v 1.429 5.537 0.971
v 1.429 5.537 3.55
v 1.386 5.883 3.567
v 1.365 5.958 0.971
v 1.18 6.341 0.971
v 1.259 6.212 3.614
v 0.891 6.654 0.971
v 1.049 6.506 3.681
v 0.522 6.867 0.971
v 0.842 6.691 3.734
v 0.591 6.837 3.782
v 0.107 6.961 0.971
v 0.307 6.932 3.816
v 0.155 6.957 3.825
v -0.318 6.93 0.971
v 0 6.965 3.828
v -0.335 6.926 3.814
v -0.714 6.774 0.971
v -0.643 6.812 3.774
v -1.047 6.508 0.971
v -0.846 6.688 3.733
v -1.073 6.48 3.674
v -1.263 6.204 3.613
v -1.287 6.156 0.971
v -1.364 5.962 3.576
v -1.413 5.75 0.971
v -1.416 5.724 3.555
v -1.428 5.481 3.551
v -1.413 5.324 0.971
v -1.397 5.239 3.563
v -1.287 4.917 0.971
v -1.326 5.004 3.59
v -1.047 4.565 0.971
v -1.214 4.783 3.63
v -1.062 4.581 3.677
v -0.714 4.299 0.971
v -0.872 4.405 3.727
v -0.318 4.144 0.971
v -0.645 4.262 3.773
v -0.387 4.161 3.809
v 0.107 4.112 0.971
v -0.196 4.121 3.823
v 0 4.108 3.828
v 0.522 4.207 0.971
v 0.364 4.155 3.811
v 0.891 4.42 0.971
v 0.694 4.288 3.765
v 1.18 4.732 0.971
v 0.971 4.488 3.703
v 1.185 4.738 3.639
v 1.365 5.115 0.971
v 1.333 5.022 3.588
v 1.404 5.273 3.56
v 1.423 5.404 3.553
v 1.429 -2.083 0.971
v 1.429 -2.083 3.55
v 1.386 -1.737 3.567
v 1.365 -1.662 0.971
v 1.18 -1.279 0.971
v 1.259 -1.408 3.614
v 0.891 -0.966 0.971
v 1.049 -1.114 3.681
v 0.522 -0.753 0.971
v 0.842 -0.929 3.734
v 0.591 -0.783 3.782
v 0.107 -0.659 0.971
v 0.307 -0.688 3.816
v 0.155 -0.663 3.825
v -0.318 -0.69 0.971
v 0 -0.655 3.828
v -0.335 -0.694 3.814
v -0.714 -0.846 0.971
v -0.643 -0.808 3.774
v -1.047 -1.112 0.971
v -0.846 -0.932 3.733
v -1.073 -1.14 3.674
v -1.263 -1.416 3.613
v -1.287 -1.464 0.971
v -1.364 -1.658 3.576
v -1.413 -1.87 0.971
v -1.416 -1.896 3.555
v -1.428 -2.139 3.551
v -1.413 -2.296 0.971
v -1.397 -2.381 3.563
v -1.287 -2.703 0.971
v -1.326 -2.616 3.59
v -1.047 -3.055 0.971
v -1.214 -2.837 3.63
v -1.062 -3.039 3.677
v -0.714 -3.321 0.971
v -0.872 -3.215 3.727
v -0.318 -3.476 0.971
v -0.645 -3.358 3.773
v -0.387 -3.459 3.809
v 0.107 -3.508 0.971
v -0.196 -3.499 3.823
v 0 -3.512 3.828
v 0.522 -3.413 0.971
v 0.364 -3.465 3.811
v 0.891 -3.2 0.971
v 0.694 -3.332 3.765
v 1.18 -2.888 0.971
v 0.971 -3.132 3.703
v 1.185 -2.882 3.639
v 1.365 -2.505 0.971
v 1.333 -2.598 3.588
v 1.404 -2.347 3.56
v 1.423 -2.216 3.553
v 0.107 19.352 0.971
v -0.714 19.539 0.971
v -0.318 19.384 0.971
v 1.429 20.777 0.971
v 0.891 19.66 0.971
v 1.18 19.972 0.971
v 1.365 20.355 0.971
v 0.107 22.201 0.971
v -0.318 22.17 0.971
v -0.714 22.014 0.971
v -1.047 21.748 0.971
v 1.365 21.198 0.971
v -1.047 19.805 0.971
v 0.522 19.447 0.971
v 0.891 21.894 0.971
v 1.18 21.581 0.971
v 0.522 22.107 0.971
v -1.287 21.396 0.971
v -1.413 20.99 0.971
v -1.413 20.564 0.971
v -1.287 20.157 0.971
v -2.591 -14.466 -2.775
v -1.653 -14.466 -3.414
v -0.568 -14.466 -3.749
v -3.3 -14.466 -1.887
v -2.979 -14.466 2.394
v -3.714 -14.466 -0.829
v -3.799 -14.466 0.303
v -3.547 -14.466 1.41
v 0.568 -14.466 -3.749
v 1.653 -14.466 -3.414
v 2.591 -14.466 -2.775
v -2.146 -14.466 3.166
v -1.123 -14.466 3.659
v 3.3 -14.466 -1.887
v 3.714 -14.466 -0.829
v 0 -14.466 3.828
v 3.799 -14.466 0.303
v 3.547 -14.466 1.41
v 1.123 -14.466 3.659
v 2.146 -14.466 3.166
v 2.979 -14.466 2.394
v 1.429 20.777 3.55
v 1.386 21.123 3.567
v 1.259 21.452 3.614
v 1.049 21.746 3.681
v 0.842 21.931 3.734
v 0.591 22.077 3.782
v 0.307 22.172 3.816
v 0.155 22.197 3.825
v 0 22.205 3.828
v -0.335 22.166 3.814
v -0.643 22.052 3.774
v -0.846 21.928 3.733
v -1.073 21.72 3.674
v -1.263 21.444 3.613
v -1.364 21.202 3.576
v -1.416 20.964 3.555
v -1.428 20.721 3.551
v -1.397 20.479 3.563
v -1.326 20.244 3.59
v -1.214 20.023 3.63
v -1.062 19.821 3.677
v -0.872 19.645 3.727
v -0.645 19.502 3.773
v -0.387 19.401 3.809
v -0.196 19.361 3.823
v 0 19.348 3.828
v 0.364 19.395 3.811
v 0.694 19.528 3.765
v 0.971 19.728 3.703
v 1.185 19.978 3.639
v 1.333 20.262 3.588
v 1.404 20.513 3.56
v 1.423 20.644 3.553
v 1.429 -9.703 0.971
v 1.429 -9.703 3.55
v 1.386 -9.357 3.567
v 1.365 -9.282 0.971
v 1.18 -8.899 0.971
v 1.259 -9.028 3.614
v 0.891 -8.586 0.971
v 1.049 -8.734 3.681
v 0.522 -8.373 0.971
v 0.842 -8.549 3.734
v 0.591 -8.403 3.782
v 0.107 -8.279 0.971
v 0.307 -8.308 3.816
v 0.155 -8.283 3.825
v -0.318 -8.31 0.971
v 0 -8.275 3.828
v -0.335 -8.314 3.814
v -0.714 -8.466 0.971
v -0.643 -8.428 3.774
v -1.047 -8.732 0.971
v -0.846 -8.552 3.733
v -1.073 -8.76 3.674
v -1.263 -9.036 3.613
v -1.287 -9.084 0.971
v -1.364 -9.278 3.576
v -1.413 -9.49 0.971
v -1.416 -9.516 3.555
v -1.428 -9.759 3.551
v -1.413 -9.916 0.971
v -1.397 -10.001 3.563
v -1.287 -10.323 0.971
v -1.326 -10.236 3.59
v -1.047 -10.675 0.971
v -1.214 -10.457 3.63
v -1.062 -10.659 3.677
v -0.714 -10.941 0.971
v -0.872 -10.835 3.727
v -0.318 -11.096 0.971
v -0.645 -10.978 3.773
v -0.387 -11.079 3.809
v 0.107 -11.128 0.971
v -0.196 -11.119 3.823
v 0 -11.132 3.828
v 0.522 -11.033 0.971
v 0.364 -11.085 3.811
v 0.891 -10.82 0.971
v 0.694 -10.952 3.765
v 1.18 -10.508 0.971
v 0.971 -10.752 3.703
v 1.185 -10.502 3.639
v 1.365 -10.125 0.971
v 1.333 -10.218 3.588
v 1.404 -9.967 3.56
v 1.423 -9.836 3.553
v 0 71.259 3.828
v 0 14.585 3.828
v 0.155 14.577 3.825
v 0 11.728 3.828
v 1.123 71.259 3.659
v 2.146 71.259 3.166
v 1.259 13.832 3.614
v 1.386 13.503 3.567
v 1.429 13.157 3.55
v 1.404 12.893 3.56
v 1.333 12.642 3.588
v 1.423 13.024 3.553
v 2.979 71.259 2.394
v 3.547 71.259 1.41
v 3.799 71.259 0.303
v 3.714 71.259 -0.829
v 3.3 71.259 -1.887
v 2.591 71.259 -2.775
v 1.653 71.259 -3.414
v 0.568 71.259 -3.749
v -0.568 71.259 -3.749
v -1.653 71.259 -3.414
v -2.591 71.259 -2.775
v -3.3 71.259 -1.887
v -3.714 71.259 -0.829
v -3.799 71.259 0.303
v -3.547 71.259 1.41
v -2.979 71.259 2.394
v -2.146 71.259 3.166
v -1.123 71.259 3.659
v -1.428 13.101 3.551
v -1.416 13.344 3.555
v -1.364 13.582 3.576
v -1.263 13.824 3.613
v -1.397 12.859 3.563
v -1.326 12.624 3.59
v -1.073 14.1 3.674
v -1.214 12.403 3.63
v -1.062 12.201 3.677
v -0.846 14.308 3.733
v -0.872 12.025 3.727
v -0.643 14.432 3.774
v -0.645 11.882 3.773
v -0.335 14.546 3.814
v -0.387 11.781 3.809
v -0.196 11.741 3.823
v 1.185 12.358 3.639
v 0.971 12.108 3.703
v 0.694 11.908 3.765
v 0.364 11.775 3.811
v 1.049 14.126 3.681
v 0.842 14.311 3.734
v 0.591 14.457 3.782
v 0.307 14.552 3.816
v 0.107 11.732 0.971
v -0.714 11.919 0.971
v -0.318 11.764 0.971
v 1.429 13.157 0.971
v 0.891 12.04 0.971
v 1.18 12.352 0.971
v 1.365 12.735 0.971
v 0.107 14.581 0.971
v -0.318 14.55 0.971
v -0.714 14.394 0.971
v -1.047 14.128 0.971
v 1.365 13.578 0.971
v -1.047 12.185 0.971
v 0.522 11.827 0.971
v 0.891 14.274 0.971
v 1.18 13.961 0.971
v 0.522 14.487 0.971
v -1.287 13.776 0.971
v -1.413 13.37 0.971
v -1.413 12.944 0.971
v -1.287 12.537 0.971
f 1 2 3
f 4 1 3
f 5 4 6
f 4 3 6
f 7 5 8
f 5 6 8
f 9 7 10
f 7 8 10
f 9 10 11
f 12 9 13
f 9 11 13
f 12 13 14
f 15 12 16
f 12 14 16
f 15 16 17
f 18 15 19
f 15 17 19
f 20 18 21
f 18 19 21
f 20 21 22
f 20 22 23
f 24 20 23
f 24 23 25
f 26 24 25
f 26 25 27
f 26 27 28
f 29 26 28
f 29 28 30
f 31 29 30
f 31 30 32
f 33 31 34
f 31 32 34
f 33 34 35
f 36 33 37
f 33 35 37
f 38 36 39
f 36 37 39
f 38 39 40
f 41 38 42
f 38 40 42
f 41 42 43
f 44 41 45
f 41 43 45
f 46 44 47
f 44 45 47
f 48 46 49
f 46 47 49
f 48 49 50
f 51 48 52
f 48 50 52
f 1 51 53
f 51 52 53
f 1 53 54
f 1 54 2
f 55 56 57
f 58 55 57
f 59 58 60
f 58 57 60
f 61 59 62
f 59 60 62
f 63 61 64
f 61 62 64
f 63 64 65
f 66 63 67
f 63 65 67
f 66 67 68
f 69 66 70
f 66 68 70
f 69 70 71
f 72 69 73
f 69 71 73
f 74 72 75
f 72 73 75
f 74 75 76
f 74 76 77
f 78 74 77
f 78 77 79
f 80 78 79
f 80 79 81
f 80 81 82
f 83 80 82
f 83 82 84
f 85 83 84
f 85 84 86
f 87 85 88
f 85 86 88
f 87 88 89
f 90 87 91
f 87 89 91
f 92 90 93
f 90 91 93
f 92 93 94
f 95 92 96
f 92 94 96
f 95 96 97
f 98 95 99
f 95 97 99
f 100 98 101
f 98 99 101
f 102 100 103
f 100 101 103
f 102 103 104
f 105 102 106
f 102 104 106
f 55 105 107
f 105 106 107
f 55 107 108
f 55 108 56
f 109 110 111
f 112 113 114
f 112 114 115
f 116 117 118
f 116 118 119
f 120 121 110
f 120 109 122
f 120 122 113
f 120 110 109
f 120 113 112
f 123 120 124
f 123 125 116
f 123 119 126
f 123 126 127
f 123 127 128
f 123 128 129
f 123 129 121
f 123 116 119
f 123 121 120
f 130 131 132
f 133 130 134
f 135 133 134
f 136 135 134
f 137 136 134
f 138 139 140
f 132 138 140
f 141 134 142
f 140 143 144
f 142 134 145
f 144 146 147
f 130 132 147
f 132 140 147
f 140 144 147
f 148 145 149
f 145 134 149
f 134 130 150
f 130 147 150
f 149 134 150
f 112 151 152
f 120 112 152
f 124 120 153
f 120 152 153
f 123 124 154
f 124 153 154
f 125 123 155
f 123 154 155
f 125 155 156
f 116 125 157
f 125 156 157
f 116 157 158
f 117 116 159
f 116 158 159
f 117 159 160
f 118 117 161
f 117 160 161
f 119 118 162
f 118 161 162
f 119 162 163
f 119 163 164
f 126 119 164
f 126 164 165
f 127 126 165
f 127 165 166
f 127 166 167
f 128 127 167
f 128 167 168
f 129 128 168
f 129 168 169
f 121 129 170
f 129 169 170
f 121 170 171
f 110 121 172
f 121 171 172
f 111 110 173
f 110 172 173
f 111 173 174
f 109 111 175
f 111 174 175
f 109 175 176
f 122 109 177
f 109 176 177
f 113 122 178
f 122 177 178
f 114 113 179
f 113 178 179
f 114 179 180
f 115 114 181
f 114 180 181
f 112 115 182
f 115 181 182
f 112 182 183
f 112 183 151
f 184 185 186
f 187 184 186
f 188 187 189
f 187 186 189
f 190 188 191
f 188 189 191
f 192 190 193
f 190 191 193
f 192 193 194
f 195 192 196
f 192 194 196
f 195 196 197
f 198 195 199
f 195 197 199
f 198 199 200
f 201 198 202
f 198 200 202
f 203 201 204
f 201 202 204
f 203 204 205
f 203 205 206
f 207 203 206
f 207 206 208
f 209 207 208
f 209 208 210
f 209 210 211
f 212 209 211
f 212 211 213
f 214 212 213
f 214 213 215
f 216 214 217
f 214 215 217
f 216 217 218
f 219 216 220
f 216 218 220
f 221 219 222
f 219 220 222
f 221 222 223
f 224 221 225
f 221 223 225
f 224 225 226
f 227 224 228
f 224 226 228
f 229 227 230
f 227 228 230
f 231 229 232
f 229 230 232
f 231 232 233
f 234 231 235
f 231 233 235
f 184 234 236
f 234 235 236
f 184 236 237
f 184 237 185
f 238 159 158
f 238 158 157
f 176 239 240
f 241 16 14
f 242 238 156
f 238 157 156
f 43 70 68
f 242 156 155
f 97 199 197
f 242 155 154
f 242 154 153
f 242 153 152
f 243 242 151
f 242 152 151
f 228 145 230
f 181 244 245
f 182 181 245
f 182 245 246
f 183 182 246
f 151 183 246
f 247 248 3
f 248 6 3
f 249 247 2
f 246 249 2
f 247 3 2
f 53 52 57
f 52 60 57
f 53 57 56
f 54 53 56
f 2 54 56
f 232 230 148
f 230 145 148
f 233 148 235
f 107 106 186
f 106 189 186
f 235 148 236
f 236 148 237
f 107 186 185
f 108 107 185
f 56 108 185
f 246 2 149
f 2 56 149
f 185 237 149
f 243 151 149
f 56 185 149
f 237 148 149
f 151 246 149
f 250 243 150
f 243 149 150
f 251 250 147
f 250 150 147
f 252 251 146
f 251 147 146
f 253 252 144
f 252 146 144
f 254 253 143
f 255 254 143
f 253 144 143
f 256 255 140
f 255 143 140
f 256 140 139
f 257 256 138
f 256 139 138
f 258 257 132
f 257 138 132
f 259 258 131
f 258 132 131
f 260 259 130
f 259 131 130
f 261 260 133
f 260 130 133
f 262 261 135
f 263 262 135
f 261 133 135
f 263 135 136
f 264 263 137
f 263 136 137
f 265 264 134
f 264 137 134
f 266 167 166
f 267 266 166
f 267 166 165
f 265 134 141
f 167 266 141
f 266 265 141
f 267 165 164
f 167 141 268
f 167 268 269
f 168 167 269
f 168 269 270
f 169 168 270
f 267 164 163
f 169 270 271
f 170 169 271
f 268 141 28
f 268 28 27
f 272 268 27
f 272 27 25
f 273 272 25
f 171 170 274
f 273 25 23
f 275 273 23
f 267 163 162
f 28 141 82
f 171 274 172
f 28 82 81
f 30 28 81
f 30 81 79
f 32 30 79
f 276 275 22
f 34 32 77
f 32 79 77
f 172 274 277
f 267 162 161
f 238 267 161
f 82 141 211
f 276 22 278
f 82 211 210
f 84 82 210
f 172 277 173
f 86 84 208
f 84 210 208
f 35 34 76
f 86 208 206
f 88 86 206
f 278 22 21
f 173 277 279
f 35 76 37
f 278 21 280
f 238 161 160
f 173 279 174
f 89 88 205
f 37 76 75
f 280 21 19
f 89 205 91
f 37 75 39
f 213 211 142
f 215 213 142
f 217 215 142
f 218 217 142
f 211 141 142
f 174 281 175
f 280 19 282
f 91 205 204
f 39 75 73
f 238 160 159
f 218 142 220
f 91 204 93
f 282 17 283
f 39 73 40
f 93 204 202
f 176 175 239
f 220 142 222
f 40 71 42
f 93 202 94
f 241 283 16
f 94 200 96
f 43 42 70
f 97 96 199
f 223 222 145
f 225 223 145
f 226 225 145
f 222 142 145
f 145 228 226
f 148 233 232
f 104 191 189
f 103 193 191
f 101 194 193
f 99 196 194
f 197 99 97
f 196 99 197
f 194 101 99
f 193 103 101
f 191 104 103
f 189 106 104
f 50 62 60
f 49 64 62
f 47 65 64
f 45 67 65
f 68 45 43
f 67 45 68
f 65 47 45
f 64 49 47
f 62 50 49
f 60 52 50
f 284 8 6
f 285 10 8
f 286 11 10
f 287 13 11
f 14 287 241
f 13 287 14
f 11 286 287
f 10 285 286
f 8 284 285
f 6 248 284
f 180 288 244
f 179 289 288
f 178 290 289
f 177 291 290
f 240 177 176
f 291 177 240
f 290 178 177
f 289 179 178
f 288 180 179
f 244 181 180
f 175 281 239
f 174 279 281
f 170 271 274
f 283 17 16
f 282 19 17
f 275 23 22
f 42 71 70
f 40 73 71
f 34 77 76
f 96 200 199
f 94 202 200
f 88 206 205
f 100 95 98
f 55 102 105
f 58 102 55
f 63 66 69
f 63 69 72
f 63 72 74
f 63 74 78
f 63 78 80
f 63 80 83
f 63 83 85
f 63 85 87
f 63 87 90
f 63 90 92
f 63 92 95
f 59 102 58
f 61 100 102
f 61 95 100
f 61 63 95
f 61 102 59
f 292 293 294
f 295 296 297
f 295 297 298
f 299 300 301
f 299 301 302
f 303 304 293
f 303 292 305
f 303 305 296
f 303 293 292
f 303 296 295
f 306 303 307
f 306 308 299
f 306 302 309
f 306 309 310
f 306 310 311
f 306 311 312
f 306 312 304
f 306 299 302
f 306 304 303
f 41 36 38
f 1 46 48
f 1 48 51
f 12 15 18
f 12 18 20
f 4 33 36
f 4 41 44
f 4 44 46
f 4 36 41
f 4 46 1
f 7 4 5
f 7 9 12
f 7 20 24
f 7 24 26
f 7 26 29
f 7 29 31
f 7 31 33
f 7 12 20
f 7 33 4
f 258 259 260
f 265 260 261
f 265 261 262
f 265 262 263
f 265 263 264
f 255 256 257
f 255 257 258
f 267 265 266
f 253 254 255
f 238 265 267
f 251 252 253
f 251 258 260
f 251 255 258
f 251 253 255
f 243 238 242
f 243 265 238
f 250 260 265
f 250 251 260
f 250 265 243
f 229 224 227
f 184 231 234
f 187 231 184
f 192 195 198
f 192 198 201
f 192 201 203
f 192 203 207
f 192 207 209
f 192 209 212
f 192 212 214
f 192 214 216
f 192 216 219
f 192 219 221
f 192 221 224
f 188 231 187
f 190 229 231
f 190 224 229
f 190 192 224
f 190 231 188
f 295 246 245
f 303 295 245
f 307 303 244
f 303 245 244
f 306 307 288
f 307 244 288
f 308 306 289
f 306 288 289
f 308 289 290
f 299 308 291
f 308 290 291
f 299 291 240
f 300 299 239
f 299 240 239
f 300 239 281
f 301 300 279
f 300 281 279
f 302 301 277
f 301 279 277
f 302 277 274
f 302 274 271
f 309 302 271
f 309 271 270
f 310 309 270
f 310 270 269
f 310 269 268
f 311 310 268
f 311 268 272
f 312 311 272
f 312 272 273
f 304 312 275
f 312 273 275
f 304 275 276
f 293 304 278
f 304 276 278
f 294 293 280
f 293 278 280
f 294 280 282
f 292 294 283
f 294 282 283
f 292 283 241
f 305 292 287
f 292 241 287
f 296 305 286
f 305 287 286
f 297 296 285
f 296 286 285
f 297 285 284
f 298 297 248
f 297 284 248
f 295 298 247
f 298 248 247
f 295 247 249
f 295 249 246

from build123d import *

# Parameters (mm, degrees)
SKETCH1_R           = 2.54
BOSS_EXTRUDE1_DEPTH = 57.15
SKETCH2_R           = 0.9525
CUT_EXTRUDE1_DEPTH  = 1.905
SCALE1_SCALE        = 1.5


with BuildPart() as part:
    # Sketch1 → Boss-Extrude1 (new body)
    with BuildSketch(Plane(origin=(0, 0, 0), x_dir=(1, 0, 0), z_dir=(0, 1, 0))):
        with Locations(Location((0, 0, 0), (0, 0, 270))):
            Circle(SKETCH1_R)
    extrude(amount=BOSS_EXTRUDE1_DEPTH)

    # Sketch2 → Cut-Extrude1 (cut)
    with BuildSketch(Plane.XY.offset(2.54)):
        with Locations((0, 18.415)):
            Circle(SKETCH2_R)
        with Locations((0, 13.335)):
            Circle(SKETCH2_R)
        with Locations((0, 8.255)):
            Circle(SKETCH2_R)
        with Locations((0, 23.495)):
            Circle(SKETCH2_R)
        with Locations((0, 3.175)):
            Circle(SKETCH2_R)
    extrude(amount=-CUT_EXTRUDE1_DEPTH, mode=Mode.SUBTRACT)


with BuildPart() as part_1:
    # Scale1: scaled about (3.3e-08, 28.93183337, -0.036650166)
    add(part.part.scale(SCALE1_SCALE).moved(Location((-1.6e-08, -14.465916685, 0.018325083))))


solid = part_1.part
